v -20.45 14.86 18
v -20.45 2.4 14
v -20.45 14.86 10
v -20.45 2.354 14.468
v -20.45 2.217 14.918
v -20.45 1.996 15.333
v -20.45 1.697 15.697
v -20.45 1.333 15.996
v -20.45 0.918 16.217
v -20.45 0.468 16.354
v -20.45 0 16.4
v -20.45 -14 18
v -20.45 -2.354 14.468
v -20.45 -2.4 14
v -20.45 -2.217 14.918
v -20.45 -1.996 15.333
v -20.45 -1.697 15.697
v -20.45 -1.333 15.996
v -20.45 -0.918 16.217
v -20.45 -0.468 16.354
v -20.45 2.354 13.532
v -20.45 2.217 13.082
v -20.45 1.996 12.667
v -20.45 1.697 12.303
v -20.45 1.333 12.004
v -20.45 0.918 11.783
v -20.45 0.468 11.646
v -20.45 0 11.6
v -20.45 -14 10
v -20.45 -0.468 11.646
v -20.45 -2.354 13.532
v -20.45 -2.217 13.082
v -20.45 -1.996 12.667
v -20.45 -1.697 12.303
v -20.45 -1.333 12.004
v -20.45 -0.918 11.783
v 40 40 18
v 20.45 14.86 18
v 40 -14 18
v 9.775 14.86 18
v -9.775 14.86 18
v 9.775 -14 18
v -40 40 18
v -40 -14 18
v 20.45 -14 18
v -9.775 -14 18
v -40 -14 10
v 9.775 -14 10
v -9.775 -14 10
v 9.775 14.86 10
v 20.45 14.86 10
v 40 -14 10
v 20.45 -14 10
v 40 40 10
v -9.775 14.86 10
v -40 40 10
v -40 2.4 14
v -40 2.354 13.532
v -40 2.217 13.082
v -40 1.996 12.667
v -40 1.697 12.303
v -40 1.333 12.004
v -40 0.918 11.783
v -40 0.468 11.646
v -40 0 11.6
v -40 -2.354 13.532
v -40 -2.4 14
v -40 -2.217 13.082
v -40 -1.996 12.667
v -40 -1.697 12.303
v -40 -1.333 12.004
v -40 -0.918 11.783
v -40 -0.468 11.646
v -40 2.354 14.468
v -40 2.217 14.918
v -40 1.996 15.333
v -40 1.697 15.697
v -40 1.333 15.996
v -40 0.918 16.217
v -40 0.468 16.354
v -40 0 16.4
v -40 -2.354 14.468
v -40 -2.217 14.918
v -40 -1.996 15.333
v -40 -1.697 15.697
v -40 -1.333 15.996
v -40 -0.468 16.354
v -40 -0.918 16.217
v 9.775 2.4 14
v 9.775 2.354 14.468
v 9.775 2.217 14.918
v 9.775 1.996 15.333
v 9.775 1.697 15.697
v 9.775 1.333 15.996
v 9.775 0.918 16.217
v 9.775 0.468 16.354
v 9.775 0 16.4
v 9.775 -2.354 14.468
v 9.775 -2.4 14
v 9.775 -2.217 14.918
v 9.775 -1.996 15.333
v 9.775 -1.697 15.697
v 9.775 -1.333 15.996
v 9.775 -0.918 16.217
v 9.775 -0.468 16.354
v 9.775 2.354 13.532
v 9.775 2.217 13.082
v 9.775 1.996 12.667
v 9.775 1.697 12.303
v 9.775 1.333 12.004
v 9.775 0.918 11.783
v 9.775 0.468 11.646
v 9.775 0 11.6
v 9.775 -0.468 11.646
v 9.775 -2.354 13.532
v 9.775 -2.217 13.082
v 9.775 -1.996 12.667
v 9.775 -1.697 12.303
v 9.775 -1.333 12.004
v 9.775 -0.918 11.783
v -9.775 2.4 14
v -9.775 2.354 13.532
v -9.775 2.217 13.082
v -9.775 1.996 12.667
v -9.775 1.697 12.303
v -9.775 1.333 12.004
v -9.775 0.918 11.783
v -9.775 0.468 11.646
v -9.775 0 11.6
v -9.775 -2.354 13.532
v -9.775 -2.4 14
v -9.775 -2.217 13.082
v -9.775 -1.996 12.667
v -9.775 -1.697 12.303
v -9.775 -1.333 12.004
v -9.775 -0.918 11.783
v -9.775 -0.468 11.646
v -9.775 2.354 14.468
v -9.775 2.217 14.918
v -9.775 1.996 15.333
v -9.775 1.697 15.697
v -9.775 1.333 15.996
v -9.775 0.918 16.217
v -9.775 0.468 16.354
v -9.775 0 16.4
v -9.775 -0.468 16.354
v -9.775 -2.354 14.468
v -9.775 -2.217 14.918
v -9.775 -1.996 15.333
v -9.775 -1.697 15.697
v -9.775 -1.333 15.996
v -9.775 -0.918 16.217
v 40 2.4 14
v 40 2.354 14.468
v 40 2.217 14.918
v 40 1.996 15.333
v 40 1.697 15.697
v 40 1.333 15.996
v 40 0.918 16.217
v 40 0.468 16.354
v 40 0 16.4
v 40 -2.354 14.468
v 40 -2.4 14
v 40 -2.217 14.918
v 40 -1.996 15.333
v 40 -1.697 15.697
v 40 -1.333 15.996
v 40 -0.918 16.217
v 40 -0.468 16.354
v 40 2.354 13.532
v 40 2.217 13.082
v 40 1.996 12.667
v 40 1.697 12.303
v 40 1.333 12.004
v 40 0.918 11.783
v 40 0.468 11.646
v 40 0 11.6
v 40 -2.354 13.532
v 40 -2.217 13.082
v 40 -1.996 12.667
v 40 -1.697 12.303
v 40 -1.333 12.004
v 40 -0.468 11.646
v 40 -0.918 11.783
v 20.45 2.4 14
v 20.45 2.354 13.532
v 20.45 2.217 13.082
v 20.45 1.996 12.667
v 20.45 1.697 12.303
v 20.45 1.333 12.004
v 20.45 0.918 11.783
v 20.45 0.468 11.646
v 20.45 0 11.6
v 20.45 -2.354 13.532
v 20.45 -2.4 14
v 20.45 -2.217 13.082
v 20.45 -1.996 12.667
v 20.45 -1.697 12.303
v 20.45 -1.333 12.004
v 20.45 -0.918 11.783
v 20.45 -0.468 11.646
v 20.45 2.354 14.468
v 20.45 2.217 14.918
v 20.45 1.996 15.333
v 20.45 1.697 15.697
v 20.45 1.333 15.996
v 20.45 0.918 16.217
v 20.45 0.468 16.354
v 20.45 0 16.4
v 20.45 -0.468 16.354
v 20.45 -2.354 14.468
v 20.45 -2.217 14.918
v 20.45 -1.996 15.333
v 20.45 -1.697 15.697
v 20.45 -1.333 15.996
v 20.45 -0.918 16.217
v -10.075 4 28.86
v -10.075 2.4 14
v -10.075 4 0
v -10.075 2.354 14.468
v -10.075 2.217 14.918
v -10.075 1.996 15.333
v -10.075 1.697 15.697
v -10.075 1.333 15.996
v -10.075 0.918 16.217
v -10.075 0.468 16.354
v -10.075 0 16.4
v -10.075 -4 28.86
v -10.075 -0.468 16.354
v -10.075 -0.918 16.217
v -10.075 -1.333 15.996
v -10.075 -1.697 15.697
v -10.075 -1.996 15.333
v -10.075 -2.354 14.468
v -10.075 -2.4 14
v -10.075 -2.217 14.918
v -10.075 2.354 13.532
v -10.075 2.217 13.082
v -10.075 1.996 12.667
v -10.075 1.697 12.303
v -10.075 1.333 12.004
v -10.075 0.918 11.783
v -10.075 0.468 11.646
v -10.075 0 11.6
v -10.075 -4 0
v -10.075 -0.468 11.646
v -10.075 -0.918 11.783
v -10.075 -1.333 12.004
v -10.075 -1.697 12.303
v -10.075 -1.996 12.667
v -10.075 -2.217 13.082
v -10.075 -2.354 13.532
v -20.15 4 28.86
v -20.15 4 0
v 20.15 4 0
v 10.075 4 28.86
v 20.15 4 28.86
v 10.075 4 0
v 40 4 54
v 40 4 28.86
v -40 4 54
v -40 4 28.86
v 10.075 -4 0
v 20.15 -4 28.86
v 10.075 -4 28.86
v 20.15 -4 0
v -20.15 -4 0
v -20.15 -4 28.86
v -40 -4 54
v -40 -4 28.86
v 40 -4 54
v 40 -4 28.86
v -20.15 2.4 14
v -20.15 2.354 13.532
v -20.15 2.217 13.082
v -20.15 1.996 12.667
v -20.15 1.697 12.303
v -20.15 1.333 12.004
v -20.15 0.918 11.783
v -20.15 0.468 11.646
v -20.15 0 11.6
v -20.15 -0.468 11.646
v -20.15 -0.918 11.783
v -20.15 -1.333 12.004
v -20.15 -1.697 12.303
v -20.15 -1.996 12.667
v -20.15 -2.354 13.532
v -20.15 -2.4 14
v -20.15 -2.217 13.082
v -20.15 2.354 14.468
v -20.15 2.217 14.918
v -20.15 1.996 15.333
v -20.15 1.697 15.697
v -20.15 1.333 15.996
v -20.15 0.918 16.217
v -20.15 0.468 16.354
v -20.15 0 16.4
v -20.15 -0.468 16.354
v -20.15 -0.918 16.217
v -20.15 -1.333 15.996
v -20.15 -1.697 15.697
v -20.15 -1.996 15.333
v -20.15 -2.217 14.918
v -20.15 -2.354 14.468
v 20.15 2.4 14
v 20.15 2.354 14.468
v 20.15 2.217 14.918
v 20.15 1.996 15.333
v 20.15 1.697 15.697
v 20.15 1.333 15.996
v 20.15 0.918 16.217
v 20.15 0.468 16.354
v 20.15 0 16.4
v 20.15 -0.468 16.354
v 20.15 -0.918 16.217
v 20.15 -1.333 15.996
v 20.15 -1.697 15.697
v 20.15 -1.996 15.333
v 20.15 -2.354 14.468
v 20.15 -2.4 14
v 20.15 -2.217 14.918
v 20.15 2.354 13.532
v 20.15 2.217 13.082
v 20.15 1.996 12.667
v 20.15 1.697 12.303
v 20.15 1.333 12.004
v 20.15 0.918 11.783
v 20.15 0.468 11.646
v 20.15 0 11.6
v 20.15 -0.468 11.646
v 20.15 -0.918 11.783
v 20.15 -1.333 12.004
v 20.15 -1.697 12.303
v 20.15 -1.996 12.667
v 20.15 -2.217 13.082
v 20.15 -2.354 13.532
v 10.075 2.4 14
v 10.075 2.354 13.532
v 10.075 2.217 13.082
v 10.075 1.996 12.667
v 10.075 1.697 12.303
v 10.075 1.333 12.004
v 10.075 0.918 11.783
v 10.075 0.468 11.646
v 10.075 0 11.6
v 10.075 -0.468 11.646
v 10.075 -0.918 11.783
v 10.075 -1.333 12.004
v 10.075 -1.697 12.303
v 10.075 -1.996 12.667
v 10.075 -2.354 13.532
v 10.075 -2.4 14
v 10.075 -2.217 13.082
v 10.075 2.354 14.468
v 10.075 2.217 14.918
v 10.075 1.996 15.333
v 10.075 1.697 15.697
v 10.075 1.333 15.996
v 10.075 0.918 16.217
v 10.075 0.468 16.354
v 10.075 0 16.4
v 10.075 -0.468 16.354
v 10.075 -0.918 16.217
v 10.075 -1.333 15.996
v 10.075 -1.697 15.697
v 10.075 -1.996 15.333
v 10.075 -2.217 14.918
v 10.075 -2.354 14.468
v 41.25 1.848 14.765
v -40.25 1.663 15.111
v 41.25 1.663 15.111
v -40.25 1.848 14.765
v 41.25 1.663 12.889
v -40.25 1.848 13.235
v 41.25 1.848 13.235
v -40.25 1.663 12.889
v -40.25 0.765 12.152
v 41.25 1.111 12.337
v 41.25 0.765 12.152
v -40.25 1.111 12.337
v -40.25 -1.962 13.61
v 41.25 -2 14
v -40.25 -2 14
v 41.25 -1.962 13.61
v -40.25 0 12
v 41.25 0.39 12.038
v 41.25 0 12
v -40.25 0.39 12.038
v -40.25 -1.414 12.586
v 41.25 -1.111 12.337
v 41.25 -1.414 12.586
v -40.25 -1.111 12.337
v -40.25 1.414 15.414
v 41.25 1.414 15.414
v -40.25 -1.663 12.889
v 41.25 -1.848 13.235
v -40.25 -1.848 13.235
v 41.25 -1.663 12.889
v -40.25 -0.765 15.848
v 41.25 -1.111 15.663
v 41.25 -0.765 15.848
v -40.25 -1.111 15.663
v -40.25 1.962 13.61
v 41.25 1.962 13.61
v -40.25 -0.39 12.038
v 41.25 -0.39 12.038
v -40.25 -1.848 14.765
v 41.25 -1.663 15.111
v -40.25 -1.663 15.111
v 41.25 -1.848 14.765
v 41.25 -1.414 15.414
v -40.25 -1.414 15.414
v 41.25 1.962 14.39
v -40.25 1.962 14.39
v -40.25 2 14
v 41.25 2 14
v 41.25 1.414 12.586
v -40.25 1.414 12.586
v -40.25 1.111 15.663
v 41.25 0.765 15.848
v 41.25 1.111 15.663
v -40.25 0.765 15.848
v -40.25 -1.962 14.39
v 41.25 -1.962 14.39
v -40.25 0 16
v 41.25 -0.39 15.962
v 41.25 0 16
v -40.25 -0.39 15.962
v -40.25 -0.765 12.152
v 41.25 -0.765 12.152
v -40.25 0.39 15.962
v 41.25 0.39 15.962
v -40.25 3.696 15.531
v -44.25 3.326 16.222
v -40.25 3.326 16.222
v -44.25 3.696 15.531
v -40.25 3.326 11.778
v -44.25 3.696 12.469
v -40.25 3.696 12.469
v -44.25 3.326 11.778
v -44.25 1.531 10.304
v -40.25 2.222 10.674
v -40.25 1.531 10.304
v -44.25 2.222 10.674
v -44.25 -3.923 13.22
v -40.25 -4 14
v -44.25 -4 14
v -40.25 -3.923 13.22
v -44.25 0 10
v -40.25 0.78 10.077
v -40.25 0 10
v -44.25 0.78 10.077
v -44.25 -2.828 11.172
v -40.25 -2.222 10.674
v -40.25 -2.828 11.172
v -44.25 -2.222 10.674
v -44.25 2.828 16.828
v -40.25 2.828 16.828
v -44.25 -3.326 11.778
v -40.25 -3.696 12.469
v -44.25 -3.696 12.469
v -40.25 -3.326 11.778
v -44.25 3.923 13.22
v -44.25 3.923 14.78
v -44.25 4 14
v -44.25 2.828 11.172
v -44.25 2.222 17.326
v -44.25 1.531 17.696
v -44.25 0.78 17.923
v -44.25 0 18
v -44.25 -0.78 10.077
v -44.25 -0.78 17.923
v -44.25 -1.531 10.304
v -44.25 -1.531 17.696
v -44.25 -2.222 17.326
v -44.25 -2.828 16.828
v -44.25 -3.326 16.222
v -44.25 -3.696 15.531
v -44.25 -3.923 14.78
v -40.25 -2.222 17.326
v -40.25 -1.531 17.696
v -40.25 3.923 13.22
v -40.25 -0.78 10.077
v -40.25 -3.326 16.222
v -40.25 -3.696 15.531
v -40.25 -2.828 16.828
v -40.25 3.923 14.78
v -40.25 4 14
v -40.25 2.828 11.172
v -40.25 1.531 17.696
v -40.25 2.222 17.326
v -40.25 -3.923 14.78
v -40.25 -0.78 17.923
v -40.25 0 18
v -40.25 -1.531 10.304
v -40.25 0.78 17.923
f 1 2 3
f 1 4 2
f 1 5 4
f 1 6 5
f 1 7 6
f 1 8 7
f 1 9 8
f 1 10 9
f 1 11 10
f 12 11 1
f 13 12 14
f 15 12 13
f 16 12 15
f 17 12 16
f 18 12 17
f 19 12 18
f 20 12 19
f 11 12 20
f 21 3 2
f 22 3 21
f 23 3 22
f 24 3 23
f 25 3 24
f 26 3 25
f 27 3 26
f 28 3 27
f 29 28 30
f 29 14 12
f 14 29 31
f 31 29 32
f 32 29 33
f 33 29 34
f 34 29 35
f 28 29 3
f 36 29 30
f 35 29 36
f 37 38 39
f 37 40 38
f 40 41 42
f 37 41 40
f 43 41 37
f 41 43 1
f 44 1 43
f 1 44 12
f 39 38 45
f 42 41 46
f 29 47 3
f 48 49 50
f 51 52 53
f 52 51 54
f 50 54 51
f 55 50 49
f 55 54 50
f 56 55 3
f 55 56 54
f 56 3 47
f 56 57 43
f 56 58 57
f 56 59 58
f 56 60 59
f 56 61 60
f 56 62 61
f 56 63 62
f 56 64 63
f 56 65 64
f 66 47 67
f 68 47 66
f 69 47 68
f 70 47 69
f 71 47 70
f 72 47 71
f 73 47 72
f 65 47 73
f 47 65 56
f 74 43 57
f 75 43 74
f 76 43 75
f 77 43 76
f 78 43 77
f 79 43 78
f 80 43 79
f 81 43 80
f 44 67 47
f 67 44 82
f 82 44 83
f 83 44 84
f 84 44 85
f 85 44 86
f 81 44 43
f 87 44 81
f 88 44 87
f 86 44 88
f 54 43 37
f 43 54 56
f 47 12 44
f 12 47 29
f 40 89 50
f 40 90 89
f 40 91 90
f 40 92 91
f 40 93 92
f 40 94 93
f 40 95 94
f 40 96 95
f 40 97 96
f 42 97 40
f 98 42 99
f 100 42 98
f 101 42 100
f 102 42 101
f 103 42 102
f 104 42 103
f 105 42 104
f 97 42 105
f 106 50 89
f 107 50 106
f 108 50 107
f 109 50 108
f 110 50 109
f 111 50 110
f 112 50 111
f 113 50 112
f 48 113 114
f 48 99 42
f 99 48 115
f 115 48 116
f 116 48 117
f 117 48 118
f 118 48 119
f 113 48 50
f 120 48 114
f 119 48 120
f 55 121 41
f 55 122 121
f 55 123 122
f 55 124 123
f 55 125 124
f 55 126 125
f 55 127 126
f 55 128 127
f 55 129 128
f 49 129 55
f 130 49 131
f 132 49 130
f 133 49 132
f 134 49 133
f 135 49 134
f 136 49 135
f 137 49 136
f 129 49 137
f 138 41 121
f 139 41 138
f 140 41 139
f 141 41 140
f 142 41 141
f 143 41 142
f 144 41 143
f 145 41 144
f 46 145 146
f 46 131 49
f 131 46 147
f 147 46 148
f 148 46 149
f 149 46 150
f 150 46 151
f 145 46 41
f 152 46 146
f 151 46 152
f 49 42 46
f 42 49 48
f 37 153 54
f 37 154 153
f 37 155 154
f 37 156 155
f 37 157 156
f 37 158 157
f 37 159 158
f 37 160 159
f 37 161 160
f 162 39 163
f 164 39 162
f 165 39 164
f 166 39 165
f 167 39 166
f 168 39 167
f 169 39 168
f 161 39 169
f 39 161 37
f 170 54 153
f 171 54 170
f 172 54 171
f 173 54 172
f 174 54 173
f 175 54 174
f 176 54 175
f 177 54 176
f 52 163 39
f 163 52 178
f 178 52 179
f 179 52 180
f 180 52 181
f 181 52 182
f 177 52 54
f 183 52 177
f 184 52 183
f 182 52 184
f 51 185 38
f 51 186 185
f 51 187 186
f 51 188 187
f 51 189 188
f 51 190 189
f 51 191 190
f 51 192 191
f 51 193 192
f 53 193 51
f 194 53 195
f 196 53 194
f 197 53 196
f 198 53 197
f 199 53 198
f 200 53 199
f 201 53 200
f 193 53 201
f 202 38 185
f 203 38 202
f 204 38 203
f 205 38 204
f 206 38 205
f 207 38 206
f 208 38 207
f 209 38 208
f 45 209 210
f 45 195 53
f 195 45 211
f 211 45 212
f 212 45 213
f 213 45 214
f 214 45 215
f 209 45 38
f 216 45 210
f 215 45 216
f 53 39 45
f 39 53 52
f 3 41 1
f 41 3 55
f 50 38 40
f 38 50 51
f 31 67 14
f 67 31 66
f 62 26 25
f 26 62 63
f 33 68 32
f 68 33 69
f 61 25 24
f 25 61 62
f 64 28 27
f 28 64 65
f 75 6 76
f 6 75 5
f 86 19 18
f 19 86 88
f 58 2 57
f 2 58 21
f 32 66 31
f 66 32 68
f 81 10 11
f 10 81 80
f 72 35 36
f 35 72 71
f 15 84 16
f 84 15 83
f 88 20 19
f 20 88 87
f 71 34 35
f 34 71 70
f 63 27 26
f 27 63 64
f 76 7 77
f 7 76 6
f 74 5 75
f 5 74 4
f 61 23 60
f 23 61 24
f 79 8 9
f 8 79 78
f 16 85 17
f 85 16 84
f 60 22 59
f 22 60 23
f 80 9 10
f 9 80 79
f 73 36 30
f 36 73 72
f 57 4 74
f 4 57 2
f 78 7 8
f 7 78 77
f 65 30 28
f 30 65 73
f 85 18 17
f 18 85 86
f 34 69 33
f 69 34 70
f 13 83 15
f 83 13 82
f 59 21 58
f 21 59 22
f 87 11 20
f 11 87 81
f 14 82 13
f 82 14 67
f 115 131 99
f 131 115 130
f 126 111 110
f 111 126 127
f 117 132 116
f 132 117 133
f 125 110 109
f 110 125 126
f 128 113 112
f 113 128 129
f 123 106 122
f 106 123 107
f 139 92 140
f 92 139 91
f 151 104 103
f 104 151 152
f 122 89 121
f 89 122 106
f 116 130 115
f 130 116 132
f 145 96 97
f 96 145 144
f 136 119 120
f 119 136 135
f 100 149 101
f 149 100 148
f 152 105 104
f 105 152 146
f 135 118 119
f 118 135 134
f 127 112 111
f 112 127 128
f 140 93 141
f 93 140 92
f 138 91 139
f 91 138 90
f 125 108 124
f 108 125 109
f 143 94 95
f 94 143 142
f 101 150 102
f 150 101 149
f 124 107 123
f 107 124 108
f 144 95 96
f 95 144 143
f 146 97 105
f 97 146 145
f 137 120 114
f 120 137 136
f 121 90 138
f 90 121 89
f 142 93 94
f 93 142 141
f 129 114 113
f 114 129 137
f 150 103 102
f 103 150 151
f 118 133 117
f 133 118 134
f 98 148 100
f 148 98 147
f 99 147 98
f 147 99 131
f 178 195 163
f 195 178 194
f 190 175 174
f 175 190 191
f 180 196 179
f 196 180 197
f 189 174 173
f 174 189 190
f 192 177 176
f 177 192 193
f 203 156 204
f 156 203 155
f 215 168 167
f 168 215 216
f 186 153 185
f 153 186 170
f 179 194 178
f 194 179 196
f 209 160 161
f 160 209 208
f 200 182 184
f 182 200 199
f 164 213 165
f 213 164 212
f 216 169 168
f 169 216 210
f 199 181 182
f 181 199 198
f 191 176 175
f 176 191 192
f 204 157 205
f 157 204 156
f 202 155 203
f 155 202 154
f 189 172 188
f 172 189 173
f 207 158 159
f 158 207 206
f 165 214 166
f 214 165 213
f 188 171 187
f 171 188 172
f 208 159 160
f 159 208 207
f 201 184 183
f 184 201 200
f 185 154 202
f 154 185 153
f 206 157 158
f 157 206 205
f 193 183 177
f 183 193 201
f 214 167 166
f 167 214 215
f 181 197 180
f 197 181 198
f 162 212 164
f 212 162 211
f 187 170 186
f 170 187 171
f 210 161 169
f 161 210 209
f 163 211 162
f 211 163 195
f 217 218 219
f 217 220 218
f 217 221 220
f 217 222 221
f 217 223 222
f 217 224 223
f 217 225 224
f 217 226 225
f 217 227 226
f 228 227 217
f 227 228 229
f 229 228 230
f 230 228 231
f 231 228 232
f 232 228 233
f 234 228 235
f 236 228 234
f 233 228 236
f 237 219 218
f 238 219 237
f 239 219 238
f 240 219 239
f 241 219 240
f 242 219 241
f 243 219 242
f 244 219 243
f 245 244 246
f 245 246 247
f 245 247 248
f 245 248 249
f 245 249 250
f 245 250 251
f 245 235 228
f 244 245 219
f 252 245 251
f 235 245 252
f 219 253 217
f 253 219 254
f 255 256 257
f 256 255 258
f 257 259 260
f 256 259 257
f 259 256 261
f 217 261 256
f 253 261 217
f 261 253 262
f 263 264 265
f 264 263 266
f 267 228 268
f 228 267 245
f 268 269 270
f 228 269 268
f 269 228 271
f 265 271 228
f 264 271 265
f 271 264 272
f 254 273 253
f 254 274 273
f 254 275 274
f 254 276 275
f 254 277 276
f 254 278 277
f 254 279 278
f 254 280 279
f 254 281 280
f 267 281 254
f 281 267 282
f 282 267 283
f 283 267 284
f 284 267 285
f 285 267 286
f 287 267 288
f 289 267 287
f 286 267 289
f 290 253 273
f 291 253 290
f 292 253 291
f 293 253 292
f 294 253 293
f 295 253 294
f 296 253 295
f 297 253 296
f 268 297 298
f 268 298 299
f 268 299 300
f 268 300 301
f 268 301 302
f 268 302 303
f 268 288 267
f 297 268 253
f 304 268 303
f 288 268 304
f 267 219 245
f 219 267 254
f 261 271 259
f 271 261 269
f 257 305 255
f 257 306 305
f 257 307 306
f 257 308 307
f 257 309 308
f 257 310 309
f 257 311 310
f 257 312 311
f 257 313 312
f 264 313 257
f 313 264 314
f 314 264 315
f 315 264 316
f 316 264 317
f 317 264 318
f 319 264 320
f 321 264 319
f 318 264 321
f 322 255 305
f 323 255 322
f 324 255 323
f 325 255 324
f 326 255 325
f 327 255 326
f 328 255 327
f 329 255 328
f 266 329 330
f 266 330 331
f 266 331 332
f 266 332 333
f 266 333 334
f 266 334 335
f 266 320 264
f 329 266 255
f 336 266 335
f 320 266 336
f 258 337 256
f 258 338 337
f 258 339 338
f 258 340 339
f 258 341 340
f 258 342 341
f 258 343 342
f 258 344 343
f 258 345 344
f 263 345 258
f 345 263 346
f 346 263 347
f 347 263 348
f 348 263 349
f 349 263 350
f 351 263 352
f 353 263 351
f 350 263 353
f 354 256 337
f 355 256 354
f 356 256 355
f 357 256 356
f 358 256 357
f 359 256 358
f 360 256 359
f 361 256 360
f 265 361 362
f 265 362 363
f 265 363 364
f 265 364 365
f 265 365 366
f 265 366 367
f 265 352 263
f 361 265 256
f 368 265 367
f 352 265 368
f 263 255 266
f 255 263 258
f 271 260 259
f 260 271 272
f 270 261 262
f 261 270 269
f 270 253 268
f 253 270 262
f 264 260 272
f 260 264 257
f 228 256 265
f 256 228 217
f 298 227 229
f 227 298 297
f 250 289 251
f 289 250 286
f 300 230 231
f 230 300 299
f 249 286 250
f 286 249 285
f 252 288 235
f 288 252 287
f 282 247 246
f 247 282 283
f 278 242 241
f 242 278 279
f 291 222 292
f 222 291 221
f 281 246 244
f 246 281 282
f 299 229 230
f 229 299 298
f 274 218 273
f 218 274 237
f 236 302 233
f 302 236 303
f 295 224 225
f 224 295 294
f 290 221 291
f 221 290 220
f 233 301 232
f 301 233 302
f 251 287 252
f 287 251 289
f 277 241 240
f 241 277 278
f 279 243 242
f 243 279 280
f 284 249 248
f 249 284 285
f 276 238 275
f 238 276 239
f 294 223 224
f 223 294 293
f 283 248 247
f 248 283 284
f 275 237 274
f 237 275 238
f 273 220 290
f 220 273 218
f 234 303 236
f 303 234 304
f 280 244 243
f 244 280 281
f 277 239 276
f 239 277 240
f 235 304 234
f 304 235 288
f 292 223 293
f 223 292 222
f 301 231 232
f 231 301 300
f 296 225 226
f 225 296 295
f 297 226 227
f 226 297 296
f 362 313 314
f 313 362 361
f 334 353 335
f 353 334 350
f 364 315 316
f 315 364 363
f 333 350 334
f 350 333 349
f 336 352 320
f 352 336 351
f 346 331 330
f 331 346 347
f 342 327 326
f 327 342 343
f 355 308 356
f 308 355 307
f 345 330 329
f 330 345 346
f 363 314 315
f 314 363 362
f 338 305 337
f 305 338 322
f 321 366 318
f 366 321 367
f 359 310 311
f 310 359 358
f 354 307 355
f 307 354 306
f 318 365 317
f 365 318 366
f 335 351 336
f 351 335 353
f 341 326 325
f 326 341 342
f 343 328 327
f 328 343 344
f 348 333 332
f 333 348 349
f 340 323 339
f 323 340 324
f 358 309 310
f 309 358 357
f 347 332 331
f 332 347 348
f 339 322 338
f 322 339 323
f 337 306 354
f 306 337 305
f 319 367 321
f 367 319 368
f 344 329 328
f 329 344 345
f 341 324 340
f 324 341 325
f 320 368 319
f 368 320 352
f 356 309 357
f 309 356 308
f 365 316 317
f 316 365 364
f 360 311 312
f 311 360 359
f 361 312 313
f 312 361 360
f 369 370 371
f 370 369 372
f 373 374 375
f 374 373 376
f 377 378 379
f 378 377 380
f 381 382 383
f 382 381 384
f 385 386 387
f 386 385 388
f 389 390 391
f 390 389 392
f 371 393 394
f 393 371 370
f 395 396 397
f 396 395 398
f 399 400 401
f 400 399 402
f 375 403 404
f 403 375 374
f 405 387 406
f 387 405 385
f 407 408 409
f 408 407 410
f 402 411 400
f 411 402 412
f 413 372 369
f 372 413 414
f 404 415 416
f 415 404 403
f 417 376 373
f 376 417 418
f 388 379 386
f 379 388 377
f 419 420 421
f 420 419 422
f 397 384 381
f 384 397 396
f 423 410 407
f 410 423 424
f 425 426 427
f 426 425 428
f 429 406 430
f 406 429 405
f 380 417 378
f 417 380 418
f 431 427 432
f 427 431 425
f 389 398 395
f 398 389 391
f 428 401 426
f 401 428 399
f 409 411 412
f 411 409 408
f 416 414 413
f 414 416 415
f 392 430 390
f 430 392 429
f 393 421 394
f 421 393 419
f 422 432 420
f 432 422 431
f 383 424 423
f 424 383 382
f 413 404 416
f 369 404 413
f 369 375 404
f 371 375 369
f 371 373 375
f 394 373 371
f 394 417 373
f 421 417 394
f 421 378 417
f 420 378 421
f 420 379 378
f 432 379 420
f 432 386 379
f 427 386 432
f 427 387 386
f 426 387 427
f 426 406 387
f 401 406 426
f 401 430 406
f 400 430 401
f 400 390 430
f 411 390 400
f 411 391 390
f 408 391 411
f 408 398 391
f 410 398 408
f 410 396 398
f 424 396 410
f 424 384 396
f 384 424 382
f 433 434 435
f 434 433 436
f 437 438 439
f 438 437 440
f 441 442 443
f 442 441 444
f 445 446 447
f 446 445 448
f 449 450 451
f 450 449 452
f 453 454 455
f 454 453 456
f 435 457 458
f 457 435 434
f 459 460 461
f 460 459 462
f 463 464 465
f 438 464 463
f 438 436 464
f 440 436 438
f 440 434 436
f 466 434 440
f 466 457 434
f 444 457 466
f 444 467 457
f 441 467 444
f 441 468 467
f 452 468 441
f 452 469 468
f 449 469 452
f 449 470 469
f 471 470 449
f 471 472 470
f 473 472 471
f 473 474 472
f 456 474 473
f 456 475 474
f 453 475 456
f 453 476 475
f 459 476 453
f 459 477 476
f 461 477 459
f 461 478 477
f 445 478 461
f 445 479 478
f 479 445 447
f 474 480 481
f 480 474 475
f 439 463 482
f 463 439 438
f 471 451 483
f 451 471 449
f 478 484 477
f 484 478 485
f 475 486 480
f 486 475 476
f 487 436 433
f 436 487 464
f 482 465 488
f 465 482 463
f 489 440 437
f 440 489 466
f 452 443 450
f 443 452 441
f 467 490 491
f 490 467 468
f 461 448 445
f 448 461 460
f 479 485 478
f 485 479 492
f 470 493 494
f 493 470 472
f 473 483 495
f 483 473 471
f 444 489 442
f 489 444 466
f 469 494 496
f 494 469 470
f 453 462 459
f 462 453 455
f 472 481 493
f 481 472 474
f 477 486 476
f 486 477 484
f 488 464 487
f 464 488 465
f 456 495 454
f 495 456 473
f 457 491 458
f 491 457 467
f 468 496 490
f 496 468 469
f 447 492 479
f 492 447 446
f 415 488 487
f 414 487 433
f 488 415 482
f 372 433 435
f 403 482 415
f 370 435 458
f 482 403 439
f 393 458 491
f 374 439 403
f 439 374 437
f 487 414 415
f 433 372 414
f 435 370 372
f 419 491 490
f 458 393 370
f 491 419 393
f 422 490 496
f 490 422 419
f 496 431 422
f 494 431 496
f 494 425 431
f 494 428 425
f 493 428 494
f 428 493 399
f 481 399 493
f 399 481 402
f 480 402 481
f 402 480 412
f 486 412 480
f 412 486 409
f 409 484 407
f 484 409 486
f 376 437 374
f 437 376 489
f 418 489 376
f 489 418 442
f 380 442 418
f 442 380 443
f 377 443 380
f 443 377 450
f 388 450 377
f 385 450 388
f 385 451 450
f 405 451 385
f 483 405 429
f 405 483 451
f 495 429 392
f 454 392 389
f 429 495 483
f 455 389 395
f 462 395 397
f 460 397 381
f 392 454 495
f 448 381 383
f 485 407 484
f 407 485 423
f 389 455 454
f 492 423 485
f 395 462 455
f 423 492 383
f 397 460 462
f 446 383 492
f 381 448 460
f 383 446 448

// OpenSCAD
$fn = 32;

// ------------------------------------------------------------------------
// Butt hinge: hinge 80 mm, leaf swung 270 deg
// Every part is its own module, assembly() places every instance.
// ------------------------------------------------------------------------

// --- part 1 ---
module hinge_base() {
  difference() {
    union() {
      translate([-40, -14, -4]) cube([19.55, 54, 8]);
      translate([-9.775, -14, -4]) cube([19.55, 54, 8]);
      translate([20.45, -14, -4]) cube([19.55, 54, 8]);
      translate([-40, 14.86, -4]) cube([80, 25.14, 8]);
    }
    translate([-30.225, 0, 0]) rotate([0, 90, 0]) cylinder(h = 21.55, d = 4.8, center = true);
    translate([0, 0, 0]) rotate([0, 90, 0]) cylinder(h = 21.55, d = 4.8, center = true);
    translate([30.225, 0, 0]) rotate([0, 90, 0]) cylinder(h = 21.55, d = 4.8, center = true);
  }
}

// --- part 2 ---
module hinge_mover() {
  difference() {
    union() {
      translate([-20.15, -40, -4]) cube([10.075, 54, 8]);
      translate([10.075, -40, -4]) cube([10.075, 54, 8]);
      translate([-40, -40, -4]) cube([80, 25.14, 8]);
    }
    translate([-15.113, 0, 0]) rotate([0, 90, 0]) cylinder(h = 12.075, d = 4.8, center = true);
    translate([15.113, 0, 0]) rotate([0, 90, 0]) cylinder(h = 12.075, d = 4.8, center = true);
  }
}

// --- part 3 ---
module hinge_pin() {
  rotate([0, 90, 0]) cylinder(h = 82.5, d = 4, center = true);
  translate([-44.25, 0, 0]) rotate([0, 90, 0]) cylinder(h = 4, d = 8);
}

// --- assembly ---
module assembly() {
  color([0.80, 0.24, 0.20]) translate([0, 0, 14]) rotate([0, 0, 0]) hinge_base();
  color([0.20, 0.45, 0.75]) translate([0, 0, 14]) rotate([270, 0, 0]) hinge_mover();
  color([0.25, 0.62, 0.32]) translate([0, 0, 14]) rotate([0, 0, 0]) hinge_pin();
}

assembly();
